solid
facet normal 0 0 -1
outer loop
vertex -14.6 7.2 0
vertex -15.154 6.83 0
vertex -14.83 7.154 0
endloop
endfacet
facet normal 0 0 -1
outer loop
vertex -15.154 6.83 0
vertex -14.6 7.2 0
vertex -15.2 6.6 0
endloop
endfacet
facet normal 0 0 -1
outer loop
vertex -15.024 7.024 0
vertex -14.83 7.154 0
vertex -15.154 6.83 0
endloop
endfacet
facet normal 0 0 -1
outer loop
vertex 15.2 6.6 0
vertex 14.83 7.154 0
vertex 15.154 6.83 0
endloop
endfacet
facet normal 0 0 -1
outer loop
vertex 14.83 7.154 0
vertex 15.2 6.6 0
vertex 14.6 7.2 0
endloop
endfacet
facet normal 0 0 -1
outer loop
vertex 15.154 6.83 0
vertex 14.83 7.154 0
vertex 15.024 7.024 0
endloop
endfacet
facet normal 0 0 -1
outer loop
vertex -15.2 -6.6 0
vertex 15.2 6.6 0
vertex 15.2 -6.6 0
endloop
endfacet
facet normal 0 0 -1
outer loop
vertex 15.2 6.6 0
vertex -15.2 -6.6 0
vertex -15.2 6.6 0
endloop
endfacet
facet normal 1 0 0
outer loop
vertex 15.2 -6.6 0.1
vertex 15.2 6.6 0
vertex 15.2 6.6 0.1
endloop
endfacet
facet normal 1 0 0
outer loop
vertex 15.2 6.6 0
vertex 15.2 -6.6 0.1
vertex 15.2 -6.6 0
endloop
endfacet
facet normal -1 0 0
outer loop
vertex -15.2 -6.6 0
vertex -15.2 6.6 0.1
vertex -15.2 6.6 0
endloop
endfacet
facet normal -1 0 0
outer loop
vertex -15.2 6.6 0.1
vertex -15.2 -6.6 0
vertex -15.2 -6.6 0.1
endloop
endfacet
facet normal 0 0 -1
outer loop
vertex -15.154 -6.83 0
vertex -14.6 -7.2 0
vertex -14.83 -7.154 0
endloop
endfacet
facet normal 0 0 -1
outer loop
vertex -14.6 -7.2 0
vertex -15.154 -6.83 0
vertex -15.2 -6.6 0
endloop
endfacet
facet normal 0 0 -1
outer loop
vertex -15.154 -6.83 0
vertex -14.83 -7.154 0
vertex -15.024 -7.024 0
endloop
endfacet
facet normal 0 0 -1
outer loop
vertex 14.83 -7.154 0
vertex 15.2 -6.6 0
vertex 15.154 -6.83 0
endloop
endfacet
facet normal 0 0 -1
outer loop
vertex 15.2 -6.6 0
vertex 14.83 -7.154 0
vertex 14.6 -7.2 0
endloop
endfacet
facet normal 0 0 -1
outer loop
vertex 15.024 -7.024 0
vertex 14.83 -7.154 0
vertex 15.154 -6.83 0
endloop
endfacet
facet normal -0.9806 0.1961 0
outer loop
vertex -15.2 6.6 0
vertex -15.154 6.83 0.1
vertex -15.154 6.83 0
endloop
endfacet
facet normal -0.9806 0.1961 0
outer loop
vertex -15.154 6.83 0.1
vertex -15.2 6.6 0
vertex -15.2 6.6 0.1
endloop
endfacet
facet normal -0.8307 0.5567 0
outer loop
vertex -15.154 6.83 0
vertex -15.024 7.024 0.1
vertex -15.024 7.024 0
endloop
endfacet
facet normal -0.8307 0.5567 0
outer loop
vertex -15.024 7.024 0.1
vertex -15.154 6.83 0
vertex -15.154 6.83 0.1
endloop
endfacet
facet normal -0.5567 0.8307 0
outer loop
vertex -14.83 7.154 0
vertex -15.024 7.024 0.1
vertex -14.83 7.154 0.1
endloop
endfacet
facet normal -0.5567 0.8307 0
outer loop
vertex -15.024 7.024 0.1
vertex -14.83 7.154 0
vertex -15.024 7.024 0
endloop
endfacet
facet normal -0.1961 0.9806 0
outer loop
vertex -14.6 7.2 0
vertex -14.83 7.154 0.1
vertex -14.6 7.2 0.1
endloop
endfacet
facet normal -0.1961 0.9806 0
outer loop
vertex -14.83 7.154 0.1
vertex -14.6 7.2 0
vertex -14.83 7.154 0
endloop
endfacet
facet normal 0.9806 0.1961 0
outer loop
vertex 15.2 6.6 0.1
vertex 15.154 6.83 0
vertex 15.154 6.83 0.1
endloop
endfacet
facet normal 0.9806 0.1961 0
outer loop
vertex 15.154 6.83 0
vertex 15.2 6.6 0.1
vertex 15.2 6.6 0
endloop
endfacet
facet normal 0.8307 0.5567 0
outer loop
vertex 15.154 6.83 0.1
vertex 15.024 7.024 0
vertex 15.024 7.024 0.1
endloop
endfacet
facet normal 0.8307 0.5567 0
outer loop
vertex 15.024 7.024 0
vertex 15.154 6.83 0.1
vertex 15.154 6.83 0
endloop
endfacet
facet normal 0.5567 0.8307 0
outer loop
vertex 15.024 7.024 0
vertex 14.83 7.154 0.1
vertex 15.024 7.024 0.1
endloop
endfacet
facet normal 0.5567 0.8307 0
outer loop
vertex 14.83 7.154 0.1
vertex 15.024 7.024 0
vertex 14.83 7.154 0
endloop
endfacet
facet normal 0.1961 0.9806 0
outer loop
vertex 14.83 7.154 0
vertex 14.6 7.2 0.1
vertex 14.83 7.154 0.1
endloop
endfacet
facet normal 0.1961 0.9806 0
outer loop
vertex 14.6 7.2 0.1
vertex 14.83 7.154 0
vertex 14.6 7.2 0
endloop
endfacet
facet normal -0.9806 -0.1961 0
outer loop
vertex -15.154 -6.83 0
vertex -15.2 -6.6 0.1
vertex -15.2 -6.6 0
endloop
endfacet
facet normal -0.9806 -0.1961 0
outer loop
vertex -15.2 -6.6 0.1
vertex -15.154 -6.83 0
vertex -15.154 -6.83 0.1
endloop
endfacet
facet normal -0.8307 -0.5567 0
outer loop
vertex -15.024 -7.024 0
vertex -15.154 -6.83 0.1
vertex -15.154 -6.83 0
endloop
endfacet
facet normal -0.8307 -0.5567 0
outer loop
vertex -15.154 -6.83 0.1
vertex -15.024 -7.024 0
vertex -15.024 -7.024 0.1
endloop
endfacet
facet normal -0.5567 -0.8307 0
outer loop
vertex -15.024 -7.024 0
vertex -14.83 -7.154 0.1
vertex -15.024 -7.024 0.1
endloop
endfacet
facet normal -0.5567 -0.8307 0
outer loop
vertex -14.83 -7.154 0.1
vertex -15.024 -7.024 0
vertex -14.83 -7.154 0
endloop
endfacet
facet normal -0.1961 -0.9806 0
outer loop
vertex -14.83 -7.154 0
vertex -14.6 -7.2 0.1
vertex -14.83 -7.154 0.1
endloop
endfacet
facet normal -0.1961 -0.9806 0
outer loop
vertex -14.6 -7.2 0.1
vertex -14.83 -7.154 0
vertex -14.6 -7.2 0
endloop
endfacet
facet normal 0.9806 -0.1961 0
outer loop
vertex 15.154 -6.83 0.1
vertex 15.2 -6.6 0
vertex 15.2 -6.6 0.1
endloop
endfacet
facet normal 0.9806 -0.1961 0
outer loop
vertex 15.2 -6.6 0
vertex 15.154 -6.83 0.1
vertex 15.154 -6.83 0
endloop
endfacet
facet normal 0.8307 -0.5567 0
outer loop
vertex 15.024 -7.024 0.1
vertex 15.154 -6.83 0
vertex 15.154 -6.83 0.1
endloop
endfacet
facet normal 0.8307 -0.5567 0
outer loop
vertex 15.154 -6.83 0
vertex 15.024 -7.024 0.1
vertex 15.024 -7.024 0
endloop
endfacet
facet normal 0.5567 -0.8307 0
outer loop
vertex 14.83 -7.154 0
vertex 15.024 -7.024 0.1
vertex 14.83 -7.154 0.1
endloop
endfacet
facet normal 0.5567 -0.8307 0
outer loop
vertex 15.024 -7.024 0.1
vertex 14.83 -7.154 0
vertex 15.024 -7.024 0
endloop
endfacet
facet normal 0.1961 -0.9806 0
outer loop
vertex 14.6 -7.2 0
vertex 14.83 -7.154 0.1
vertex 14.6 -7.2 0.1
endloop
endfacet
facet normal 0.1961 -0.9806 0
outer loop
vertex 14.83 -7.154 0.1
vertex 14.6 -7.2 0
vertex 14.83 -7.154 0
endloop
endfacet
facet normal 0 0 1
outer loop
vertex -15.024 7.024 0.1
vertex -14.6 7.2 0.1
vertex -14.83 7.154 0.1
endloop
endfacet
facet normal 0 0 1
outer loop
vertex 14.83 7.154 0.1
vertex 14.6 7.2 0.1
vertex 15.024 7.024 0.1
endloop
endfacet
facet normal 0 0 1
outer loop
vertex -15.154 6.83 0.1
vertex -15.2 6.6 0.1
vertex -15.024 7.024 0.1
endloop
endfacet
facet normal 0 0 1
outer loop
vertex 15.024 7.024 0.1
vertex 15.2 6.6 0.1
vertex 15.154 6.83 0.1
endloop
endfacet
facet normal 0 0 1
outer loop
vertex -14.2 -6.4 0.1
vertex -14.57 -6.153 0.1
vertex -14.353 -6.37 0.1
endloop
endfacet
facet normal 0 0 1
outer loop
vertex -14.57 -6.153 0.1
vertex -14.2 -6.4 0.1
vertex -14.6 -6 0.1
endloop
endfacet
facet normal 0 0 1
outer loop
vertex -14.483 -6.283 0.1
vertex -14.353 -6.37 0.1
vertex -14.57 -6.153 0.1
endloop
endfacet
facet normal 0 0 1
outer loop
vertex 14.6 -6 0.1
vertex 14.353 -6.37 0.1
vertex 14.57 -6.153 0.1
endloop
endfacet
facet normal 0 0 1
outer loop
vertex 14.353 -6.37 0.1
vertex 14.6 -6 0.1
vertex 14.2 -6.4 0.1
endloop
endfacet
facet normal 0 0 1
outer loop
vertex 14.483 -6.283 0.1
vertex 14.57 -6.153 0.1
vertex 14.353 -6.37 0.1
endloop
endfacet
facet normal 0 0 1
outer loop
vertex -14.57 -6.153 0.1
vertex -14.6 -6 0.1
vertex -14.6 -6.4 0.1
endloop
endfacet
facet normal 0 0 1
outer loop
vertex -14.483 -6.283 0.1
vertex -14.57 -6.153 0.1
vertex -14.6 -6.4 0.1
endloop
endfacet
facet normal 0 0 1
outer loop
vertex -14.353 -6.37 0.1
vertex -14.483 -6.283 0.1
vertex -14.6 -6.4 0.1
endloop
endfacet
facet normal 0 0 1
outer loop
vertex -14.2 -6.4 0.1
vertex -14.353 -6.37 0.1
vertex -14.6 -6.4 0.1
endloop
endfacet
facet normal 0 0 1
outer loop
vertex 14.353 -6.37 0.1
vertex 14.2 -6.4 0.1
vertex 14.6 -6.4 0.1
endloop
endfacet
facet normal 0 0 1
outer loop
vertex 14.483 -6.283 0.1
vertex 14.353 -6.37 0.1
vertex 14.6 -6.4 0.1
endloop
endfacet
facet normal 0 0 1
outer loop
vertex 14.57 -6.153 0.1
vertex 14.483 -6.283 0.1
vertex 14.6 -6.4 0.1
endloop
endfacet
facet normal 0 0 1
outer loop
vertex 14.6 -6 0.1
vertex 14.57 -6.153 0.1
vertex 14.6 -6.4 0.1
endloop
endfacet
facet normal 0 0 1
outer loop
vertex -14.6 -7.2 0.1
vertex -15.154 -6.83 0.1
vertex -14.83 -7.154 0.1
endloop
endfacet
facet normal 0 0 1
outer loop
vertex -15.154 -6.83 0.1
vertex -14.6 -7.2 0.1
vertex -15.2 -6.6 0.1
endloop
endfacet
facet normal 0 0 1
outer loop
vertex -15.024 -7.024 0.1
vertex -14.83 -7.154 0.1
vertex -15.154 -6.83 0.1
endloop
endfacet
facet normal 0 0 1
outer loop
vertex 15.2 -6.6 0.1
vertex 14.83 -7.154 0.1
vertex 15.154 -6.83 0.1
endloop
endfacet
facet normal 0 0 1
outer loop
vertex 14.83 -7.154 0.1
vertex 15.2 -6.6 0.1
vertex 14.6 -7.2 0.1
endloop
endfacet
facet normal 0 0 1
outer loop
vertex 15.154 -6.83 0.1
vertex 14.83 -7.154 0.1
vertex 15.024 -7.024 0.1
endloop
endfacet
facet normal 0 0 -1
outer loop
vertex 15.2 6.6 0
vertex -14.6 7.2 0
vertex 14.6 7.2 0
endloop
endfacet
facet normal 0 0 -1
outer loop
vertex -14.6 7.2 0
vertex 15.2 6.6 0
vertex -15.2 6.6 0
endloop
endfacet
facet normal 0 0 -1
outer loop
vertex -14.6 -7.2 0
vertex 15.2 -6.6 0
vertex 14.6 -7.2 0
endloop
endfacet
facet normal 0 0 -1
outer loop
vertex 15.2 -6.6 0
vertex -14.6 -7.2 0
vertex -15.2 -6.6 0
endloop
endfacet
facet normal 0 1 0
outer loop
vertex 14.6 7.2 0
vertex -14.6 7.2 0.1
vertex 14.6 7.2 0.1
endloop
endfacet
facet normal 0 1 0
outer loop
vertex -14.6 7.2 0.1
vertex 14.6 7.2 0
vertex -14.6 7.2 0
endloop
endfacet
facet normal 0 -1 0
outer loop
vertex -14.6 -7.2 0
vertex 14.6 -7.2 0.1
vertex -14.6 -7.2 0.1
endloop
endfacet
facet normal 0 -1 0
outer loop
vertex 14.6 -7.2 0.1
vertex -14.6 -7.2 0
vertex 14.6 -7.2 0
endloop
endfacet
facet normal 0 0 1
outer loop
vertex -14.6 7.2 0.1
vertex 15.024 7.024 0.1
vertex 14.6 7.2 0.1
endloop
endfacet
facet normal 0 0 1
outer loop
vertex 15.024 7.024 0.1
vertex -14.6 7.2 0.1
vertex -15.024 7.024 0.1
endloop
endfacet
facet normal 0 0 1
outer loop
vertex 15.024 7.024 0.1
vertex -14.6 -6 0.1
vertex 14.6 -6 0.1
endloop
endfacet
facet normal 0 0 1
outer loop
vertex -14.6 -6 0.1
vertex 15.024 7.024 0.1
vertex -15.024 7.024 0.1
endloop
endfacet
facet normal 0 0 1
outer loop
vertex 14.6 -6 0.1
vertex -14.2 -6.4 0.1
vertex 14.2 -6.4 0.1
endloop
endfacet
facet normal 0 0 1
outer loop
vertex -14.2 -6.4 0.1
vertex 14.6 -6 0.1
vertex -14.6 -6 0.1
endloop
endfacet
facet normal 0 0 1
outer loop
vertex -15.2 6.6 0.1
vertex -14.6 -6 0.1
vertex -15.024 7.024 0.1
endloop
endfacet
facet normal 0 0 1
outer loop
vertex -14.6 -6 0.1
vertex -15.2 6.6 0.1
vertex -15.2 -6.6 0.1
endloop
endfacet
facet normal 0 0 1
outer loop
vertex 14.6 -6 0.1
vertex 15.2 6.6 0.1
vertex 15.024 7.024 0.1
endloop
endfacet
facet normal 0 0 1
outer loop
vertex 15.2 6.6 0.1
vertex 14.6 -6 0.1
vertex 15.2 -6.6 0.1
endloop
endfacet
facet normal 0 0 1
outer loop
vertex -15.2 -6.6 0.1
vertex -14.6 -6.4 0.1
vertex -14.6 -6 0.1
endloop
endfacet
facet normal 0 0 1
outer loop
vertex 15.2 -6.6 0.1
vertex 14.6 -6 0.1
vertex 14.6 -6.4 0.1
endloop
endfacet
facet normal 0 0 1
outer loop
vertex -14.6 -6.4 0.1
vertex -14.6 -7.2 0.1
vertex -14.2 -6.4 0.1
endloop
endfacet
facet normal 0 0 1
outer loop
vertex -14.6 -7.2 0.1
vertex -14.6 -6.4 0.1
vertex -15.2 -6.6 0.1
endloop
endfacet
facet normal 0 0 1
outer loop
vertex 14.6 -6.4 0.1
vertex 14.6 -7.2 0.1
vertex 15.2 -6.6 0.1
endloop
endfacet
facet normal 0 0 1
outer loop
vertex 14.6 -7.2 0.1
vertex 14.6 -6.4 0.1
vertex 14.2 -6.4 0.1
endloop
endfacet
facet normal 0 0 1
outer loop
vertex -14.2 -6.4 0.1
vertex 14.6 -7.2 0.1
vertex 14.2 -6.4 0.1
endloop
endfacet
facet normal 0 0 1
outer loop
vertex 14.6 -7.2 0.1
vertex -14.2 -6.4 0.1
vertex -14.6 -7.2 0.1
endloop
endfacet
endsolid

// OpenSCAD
// file: ../p/box3u12.scad
use <../lib.scad>
function ldraw_lib__box3u12() = [
// 0 Box with 3 Parallel Faces without Any Edges
// 0 Name: box3u12.dat
// 0 Author: J.C. Tchang [tchang]
// 0 !LDRAW_ORG Primitive UPDATE 2014-02
// 0 !LICENSE Licensed under CC BY 2.0 and CC BY 4.0 : see CAreadme.txt
// 
// 0 BFC CERTIFY CCW
  [0,"BFC","CERTIFY"],
  [0,"BFC","CCW"],
// 
// 0 !HISTORY 2014-12-23 [PTadmin] Official Update 2014-02
// 
// 
// 4 16 -1 1 1 1 1 1 1 1 -1 -1 1 -1
  [4,16,-1,1,1,1,1,1,1,1,-1,-1,1,-1],
// 4 16 -1 1 1 -1 0 1 1 0 1 1 1 1
  [4,16,-1,1,1,-1,0,1,1,0,1,1,1,1],
// 4 16 1 1 -1 1 0 -1 -1 0 -1 -1 1 -1
  [4,16,1,1,-1,1,0,-1,-1,0,-1,-1,1,-1],
];
makepoly(ldraw_lib__box3u12(), line=0.2);
// file: ../p/1-8chrd.scad
use <../lib.scad>
function ldraw_lib__1_8chrd() = [
// 0 Chord 0.125
// 0 Name: 1-8chrd.dat
// 0 Author: Andy Westrate [westrate]
// 0 !LDRAW_ORG Primitive UPDATE 2004-02
// 0 !LICENSE Licensed under CC BY 2.0 and CC BY 4.0 : see CAreadme.txt
// 
// 0 BFC CERTIFY CCW
  [0,"BFC","CERTIFY"],
  [0,"BFC","CCW"],
// 
// 0 !HISTORY 2004-04-22 [PTadmin] Official Update 2004-02
// 0 !HISTORY 2007-06-22 [PTadmin] Header formatted for Contributor Agreement
// 0 !HISTORY 2008-07-01 [PTadmin] Official Update 2008-01
// 
// 
// 3 16 0.7071 0 0.7071 1 0 0 0.9239 0 0.3827
  [3,16,0.7071,0,0.7071,1,0,0,0.9239,0,0.3827],
// 
// 0
];
makepoly(ldraw_lib__1_8chrd(), line=0.2);
// file: ../p/1-4ndis.scad
use <../lib.scad>
function ldraw_lib__1_4ndis() = [
// 0 Disc Negative 0.25
// 0 Name: 1-4ndis.dat
// 0 Author: James Jessiman
// 0 !LDRAW_ORG Primitive UPDATE 2012-01
// 0 !LICENSE Licensed under CC BY 2.0 and CC BY 4.0 : see CAreadme.txt
// 
// 0 BFC CERTIFY CCW
  [0,"BFC","CERTIFY"],
  [0,"BFC","CCW"],
// 
// 0 !HISTORY 2002-03-23 [sbliss] Added BFC Statement
// 0 !HISTORY 2002-04-25 [PTadmin] Official Update 2002-02
// 0 !HISTORY 2007-06-22 [PTadmin] Header formatted for Contributor Agreement
// 0 !HISTORY 2008-07-01 [PTadmin] Official Update 2008-01
// 0 !HISTORY 2012-02-16 [Philo] Changed to CCW
// 0 !HISTORY 2012-03-30 [PTadmin] Official Update 2012-01
// 
// 
// 3 16 0.9239 0 0.3827 1 0 0 1 0 1
  [3,16,0.9239,0,0.3827,1,0,0,1,0,1],
// 3 16 0.7071 0 0.7071 0.9239 0 0.3827 1 0 1
  [3,16,0.7071,0,0.7071,0.9239,0,0.3827,1,0,1],
// 3 16 0.3827 0 0.9239 0.7071 0 0.7071 1 0 1
  [3,16,0.3827,0,0.9239,0.7071,0,0.7071,1,0,1],
// 3 16 0 0 1 0.3827 0 0.9239 1 0 1
  [3,16,0,0,1,0.3827,0,0.9239,1,0,1],
];
makepoly(ldraw_lib__1_4ndis(), line=0.2);
// file: ../p/1-4cyli.scad
use <../lib.scad>
function ldraw_lib__1_4cyli() = [
// 0 Cylinder 0.25
// 0 Name: 1-4cyli.dat
// 0 Author: James Jessiman
// 0 !LDRAW_ORG Primitive UPDATE 2012-01
// 0 !LICENSE Licensed under CC BY 2.0 and CC BY 4.0 : see CAreadme.txt
// 
// 0 BFC CERTIFY CCW
  [0,"BFC","CERTIFY"],
  [0,"BFC","CCW"],
// 
// 0 !HISTORY 2002-03-23 [sbliss] Added BFC statement.
// 0 !HISTORY 2002-04-25 [PTadmin] Official Update 2002-02
// 0 !HISTORY 2007-06-22 [PTadmin] Header formatted for Contributor Agreement
// 0 !HISTORY 2008-07-01 [PTadmin] Official Update 2008-01
// 0 !HISTORY 2012-02-16 [Philo] Changed to CCW
// 0 !HISTORY 2012-03-30 [PTadmin] Official Update 2012-01
// 
// 
// 4 16 1 1 0 0.9239 1 0.3827 0.9239 0 0.3827 1 0 0
  [4,16,1,1,0,0.9239,1,0.3827,0.9239,0,0.3827,1,0,0],
// 5 24 1 0 0 1 1 0 0.9239 0 0.3827 1 0 -1
  [5,24,1,0,0,1,1,0,0.9239,0,0.3827,1,0,-1],
// 4 16 0.9239 1 0.3827 0.7071 1 0.7071 0.7071 0 0.7071 0.9239 0 0.3827
  [4,16,0.9239,1,0.3827,0.7071,1,0.7071,0.7071,0,0.7071,0.9239,0,0.3827],
// 5 24 0.9239 0 0.3827 0.9239 1 0.3827 0.7071 0 0.7071 1 0 0
  [5,24,0.9239,0,0.3827,0.9239,1,0.3827,0.7071,0,0.7071,1,0,0],
// 4 16 0.7071 1 0.7071 0.3827 1 0.9239 0.3827 0 0.9239 0.7071 0 0.7071
  [4,16,0.7071,1,0.7071,0.3827,1,0.9239,0.3827,0,0.9239,0.7071,0,0.7071],
// 5 24 0.7071 0 0.7071 0.7071 1 0.7071 0.3827 0 0.9239 0.9239 0 0.3827
  [5,24,0.7071,0,0.7071,0.7071,1,0.7071,0.3827,0,0.9239,0.9239,0,0.3827],
// 4 16 0.3827 1 0.9239 0 1 1 0 0 1 0.3827 0 0.9239
  [4,16,0.3827,1,0.9239,0,1,1,0,0,1,0.3827,0,0.9239],
// 5 24 0.3827 0 0.9239 0.3827 1 0.9239 0 0 1 0.7071 0 0.7071
  [5,24,0.3827,0,0.9239,0.3827,1,0.9239,0,0,1,0.7071,0,0.7071],
// 5 24 0 0 1 0 1 1 0.3827 0 0.9239 -1 0 1
  [5,24,0,0,1,0,1,1,0.3827,0,0.9239,-1,0,1],
];
makepoly(ldraw_lib__1_4cyli(), line=0.2);
// file: ../p/1-4chrd.scad
use <../lib.scad>
function ldraw_lib__1_4chrd() = [
// 0 Chord 0.25
// 0 Name: 1-4chrd.dat
// 0 Author: Tony Hafner [hafhead]
// 0 !LDRAW_ORG Primitive UPDATE 2012-02
// 0 !LICENSE Licensed under CC BY 2.0 and CC BY 4.0 : see CAreadme.txt
// 
// 0 BFC CERTIFY CCW
  [0,"BFC","CERTIFY"],
  [0,"BFC","CCW"],
// 
// 0 !HISTORY 2004-04-22 [PTadmin] Official Update 2004-02
// 0 !HISTORY 2007-10-09 [PTadmin] Header formatted for Contributor Agreement
// 0 !HISTORY 2008-07-01 [PTadmin] Official Update 2008-01
// 0 !HISTORY 2012-08-02 [MMR1988] Re-creation with PrimGen2 and Rectifier
// 0 !HISTORY 2012-08-09 [PTadmin] Official Update 2012-02
// 
// 
// 4 16 0.9239 0 0.3827 0.3827 0 0.9239 0 0 1 1 0 0
  [4,16,0.9239,0,0.3827,0.3827,0,0.9239,0,0,1,1,0,0],
// 3 16 0.7071 0 0.7071 0.3827 0 0.9239 0.9239 0 0.3827
  [3,16,0.7071,0,0.7071,0.3827,0,0.9239,0.9239,0,0.3827],
];
makepoly(ldraw_lib__1_4chrd(), line=0.2);
// main file
use <../lib.scad>
use <../p/1-4chrd.scad>
use <../p/1-4cyli.scad>
use <../p/1-4ndis.scad>
use <../p/1-8chrd.scad>
use <../p/box3u12.scad>
function ldraw_lib__6142622q() = [
// 0 Sticker  1.8 x  3.8 with Black Trapezoid on Yellow Background
// 0 Name: 6142622q.dat
// 0 Author: Massimo Maso [Sirio]
// 0 !LDRAW_ORG Part UPDATE 2022-03
// 0 !LICENSE Licensed under CC BY 2.0 and CC BY 4.0 : see CAreadme.txt
// 
// 0 BFC CERTIFY CCW
  [0,"BFC","CERTIFY"],
  [0,"BFC","CCW"],
// 
// 0 !KEYWORDS Chevrolet, Corvette, Set 75870, Speed Champions
// 
// 0 !HISTORY 2022-05-07 [PTadmin] Official Update 2022-03
// 
// 
// 0 // Primitives
// 
// 1 16 -36.5 0 16.5 -1.5 0 0 0 -1 0 0 0 1.5 1-4chrd.dat
  [1,16,-36.5,0,16.5,-1.5,0,0,0,-1,0,0,0,1.5, ldraw_lib__1_4chrd()],
// 1 16 36.5 0 16.5 1.5 0 0 0 -1 0 0 0 1.5 1-4chrd.dat
  [1,16,36.5,0,16.5,1.5,0,0,0,-1,0,0,0,1.5, ldraw_lib__1_4chrd()],
// 1 16 0 -.25 0 0 0 38 0 .25 0 -16.5 0 0 box3u12.dat
  [1,16,0,-.25,0,0,0,38,0,.25,0,-16.5,0,0, ldraw_lib__box3u12()],
// 1 16 -36.5 0 -16.5 -1.5 0 0 0 -1 0 0 0 -1.5 1-4chrd.dat
  [1,16,-36.5,0,-16.5,-1.5,0,0,0,-1,0,0,0,-1.5, ldraw_lib__1_4chrd()],
// 1 16 36.5 0 -16.5 1.5 0 0 0 -1 0 0 0 -1.5 1-4chrd.dat
  [1,16,36.5,0,-16.5,1.5,0,0,0,-1,0,0,0,-1.5, ldraw_lib__1_4chrd()],
// 1 16 -36.5 0 16.5 -1.5 0 0 0 -.25 0 0 0 1.5 1-4cyli.dat
  [1,16,-36.5,0,16.5,-1.5,0,0,0,-.25,0,0,0,1.5, ldraw_lib__1_4cyli()],
// 1 16 36.5 0 16.5 1.5 0 0 0 -.25 0 0 0 1.5 1-4cyli.dat
  [1,16,36.5,0,16.5,1.5,0,0,0,-.25,0,0,0,1.5, ldraw_lib__1_4cyli()],
// 1 16 -36.5 0 -16.5 -1.5 0 0 0 -.25 0 0 0 -1.5 1-4cyli.dat
  [1,16,-36.5,0,-16.5,-1.5,0,0,0,-.25,0,0,0,-1.5, ldraw_lib__1_4cyli()],
// 1 16 36.5 0 -16.5 1.5 0 0 0 -.25 0 0 0 -1.5 1-4cyli.dat
  [1,16,36.5,0,-16.5,1.5,0,0,0,-.25,0,0,0,-1.5, ldraw_lib__1_4cyli()],
// 1 0 -36.5 -.25 16.5 0 0 -1.5 0 1 0 1.5 0 0 1-8chrd.dat
  [1,0,-36.5,-.25,16.5,0,0,-1.5,0,1,0,1.5,0,0, ldraw_lib__1_8chrd()],
// 1 0 36.5 -.25 16.5 0 0 1.5 0 1 0 1.5 0 0 1-8chrd.dat
  [1,0,36.5,-.25,16.5,0,0,1.5,0,1,0,1.5,0,0, ldraw_lib__1_8chrd()],
// 1 14 -36.5 -.25 16.5 -1.5 0 0 0 1 0 0 0 1.5 1-8chrd.dat
  [1,14,-36.5,-.25,16.5,-1.5,0,0,0,1,0,0,0,1.5, ldraw_lib__1_8chrd()],
// 1 14 36.5 -.25 16.5 1.5 0 0 0 1 0 0 0 1.5 1-8chrd.dat
  [1,14,36.5,-.25,16.5,1.5,0,0,0,1,0,0,0,1.5, ldraw_lib__1_8chrd()],
// 1 0 -35.5 -.25 -15 -1 0 0 0 1 0 0 0 -1 1-4chrd.dat
  [1,0,-35.5,-.25,-15,-1,0,0,0,1,0,0,0,-1, ldraw_lib__1_4chrd()],
// 1 0 35.5 -.25 -15 0 0 1 0 1 0 -1 0 0 1-4chrd.dat
  [1,0,35.5,-.25,-15,0,0,1,0,1,0,-1,0,0, ldraw_lib__1_4chrd()],
// 1 14 -35.5 -.25 -15 -1 0 0 0 1 0 0 0 -1 1-4ndis.dat
  [1,14,-35.5,-.25,-15,-1,0,0,0,1,0,0,0,-1, ldraw_lib__1_4ndis()],
// 1 14 35.5 -.25 -15 0 0 1 0 1 0 -1 0 0 1-4ndis.dat
  [1,14,35.5,-.25,-15,0,0,1,0,1,0,-1,0,0, ldraw_lib__1_4ndis()],
// 1 14 -36.5 -.25 -16.5 -1.5 0 0 0 1 0 0 0 -1.5 1-4chrd.dat
  [1,14,-36.5,-.25,-16.5,-1.5,0,0,0,1,0,0,0,-1.5, ldraw_lib__1_4chrd()],
// 1 14 36.5 -.25 -16.5 1.5 0 0 0 1 0 0 0 -1.5 1-4chrd.dat
  [1,14,36.5,-.25,-16.5,1.5,0,0,0,1,0,0,0,-1.5, ldraw_lib__1_4chrd()],
// 0 // Bottom face
// 4 16 36.5 0 18 38 0 16.5 -38 0 16.5 -36.5 0 18
  [4,16,36.5,0,18,38,0,16.5,-38,0,16.5,-36.5,0,18],
// 4 16 -38 0 -16.5 38 0 -16.5 36.5 0 -18 -36.5 0 -18
  [4,16,-38,0,-16.5,38,0,-16.5,36.5,0,-18,-36.5,0,-18],
// 0 // Lateral faces
// 4 16 -36.5 0 18 -36.5 -0.25 18 36.5 -0.25 18 36.5 0 18
  [4,16,-36.5,0,18,-36.5,-0.25,18,36.5,-0.25,18,36.5,0,18],
// 4 16 36.5 0 -18 36.5 -0.25 -18 -36.5 -0.25 -18 -36.5 0 -18
  [4,16,36.5,0,-18,36.5,-0.25,-18,-36.5,-0.25,-18,-36.5,0,-18],
// 0 // Top face
// 4 0 -36.5 -.25 18 -37.56065 -.25 17.56065 37.56065 -.25 17.56065 36.5 -.25 18
  [4,0,-36.5,-.25,18,-37.56065,-.25,17.56065,37.56065,-.25,17.56065,36.5,-.25,18],
// 4 0 -37.56065 -.25 17.56065 -36.5 -.25 -15 36.5 -.25 -15 37.56065 -.25 17.56065
  [4,0,-37.56065,-.25,17.56065,-36.5,-.25,-15,36.5,-.25,-15,37.56065,-.25,17.56065],
// 4 0 -36.5 -.25 -15 -35.5 -.25 -16 35.5 -.25 -16 36.5 -.25 -15
  [4,0,-36.5,-.25,-15,-35.5,-.25,-16,35.5,-.25,-16,36.5,-.25,-15],
// 4 14 -38 -.25 -16.5 -36.5 -.25 -15 -37.56065 -.25 17.56065 -38 -.25 16.5
  [4,14,-38,-.25,-16.5,-36.5,-.25,-15,-37.56065,-.25,17.56065,-38,-.25,16.5],
// 4 14 38 -.25 -16.5 38 -.25 16.5 37.56065 -.25 17.56065 36.5 -.25 -15
  [4,14,38,-.25,-16.5,38,-.25,16.5,37.56065,-.25,17.56065,36.5,-.25,-15],
// 3 14 -38 -.25 -16.5 -36.5 -.25 -16 -36.5 -.25 -15
  [3,14,-38,-.25,-16.5,-36.5,-.25,-16,-36.5,-.25,-15],
// 3 14 38 -.25 -16.5 36.5 -.25 -15 36.5 -.25 -16
  [3,14,38,-.25,-16.5,36.5,-.25,-15,36.5,-.25,-16],
// 4 14 -36.5 -.25 -18 -35.5 -.25 -16 -36.5 -.25 -16 -38 -.25 -16.5
  [4,14,-36.5,-.25,-18,-35.5,-.25,-16,-36.5,-.25,-16,-38,-.25,-16.5],
// 4 14 36.5 -.25 -16 35.5 -.25 -16 36.5 -.25 -18 38 -.25 -16.5
  [4,14,36.5,-.25,-16,35.5,-.25,-16,36.5,-.25,-18,38,-.25,-16.5],
// 4 14 -36.5 -.25 -18 36.5 -.25 -18 35.5 -.25 -16 -35.5 -.25 -16
  [4,14,-36.5,-.25,-18,36.5,-.25,-18,35.5,-.25,-16,-35.5,-.25,-16],
];
makepoly(ldraw_lib__6142622q(), line=0.2);
